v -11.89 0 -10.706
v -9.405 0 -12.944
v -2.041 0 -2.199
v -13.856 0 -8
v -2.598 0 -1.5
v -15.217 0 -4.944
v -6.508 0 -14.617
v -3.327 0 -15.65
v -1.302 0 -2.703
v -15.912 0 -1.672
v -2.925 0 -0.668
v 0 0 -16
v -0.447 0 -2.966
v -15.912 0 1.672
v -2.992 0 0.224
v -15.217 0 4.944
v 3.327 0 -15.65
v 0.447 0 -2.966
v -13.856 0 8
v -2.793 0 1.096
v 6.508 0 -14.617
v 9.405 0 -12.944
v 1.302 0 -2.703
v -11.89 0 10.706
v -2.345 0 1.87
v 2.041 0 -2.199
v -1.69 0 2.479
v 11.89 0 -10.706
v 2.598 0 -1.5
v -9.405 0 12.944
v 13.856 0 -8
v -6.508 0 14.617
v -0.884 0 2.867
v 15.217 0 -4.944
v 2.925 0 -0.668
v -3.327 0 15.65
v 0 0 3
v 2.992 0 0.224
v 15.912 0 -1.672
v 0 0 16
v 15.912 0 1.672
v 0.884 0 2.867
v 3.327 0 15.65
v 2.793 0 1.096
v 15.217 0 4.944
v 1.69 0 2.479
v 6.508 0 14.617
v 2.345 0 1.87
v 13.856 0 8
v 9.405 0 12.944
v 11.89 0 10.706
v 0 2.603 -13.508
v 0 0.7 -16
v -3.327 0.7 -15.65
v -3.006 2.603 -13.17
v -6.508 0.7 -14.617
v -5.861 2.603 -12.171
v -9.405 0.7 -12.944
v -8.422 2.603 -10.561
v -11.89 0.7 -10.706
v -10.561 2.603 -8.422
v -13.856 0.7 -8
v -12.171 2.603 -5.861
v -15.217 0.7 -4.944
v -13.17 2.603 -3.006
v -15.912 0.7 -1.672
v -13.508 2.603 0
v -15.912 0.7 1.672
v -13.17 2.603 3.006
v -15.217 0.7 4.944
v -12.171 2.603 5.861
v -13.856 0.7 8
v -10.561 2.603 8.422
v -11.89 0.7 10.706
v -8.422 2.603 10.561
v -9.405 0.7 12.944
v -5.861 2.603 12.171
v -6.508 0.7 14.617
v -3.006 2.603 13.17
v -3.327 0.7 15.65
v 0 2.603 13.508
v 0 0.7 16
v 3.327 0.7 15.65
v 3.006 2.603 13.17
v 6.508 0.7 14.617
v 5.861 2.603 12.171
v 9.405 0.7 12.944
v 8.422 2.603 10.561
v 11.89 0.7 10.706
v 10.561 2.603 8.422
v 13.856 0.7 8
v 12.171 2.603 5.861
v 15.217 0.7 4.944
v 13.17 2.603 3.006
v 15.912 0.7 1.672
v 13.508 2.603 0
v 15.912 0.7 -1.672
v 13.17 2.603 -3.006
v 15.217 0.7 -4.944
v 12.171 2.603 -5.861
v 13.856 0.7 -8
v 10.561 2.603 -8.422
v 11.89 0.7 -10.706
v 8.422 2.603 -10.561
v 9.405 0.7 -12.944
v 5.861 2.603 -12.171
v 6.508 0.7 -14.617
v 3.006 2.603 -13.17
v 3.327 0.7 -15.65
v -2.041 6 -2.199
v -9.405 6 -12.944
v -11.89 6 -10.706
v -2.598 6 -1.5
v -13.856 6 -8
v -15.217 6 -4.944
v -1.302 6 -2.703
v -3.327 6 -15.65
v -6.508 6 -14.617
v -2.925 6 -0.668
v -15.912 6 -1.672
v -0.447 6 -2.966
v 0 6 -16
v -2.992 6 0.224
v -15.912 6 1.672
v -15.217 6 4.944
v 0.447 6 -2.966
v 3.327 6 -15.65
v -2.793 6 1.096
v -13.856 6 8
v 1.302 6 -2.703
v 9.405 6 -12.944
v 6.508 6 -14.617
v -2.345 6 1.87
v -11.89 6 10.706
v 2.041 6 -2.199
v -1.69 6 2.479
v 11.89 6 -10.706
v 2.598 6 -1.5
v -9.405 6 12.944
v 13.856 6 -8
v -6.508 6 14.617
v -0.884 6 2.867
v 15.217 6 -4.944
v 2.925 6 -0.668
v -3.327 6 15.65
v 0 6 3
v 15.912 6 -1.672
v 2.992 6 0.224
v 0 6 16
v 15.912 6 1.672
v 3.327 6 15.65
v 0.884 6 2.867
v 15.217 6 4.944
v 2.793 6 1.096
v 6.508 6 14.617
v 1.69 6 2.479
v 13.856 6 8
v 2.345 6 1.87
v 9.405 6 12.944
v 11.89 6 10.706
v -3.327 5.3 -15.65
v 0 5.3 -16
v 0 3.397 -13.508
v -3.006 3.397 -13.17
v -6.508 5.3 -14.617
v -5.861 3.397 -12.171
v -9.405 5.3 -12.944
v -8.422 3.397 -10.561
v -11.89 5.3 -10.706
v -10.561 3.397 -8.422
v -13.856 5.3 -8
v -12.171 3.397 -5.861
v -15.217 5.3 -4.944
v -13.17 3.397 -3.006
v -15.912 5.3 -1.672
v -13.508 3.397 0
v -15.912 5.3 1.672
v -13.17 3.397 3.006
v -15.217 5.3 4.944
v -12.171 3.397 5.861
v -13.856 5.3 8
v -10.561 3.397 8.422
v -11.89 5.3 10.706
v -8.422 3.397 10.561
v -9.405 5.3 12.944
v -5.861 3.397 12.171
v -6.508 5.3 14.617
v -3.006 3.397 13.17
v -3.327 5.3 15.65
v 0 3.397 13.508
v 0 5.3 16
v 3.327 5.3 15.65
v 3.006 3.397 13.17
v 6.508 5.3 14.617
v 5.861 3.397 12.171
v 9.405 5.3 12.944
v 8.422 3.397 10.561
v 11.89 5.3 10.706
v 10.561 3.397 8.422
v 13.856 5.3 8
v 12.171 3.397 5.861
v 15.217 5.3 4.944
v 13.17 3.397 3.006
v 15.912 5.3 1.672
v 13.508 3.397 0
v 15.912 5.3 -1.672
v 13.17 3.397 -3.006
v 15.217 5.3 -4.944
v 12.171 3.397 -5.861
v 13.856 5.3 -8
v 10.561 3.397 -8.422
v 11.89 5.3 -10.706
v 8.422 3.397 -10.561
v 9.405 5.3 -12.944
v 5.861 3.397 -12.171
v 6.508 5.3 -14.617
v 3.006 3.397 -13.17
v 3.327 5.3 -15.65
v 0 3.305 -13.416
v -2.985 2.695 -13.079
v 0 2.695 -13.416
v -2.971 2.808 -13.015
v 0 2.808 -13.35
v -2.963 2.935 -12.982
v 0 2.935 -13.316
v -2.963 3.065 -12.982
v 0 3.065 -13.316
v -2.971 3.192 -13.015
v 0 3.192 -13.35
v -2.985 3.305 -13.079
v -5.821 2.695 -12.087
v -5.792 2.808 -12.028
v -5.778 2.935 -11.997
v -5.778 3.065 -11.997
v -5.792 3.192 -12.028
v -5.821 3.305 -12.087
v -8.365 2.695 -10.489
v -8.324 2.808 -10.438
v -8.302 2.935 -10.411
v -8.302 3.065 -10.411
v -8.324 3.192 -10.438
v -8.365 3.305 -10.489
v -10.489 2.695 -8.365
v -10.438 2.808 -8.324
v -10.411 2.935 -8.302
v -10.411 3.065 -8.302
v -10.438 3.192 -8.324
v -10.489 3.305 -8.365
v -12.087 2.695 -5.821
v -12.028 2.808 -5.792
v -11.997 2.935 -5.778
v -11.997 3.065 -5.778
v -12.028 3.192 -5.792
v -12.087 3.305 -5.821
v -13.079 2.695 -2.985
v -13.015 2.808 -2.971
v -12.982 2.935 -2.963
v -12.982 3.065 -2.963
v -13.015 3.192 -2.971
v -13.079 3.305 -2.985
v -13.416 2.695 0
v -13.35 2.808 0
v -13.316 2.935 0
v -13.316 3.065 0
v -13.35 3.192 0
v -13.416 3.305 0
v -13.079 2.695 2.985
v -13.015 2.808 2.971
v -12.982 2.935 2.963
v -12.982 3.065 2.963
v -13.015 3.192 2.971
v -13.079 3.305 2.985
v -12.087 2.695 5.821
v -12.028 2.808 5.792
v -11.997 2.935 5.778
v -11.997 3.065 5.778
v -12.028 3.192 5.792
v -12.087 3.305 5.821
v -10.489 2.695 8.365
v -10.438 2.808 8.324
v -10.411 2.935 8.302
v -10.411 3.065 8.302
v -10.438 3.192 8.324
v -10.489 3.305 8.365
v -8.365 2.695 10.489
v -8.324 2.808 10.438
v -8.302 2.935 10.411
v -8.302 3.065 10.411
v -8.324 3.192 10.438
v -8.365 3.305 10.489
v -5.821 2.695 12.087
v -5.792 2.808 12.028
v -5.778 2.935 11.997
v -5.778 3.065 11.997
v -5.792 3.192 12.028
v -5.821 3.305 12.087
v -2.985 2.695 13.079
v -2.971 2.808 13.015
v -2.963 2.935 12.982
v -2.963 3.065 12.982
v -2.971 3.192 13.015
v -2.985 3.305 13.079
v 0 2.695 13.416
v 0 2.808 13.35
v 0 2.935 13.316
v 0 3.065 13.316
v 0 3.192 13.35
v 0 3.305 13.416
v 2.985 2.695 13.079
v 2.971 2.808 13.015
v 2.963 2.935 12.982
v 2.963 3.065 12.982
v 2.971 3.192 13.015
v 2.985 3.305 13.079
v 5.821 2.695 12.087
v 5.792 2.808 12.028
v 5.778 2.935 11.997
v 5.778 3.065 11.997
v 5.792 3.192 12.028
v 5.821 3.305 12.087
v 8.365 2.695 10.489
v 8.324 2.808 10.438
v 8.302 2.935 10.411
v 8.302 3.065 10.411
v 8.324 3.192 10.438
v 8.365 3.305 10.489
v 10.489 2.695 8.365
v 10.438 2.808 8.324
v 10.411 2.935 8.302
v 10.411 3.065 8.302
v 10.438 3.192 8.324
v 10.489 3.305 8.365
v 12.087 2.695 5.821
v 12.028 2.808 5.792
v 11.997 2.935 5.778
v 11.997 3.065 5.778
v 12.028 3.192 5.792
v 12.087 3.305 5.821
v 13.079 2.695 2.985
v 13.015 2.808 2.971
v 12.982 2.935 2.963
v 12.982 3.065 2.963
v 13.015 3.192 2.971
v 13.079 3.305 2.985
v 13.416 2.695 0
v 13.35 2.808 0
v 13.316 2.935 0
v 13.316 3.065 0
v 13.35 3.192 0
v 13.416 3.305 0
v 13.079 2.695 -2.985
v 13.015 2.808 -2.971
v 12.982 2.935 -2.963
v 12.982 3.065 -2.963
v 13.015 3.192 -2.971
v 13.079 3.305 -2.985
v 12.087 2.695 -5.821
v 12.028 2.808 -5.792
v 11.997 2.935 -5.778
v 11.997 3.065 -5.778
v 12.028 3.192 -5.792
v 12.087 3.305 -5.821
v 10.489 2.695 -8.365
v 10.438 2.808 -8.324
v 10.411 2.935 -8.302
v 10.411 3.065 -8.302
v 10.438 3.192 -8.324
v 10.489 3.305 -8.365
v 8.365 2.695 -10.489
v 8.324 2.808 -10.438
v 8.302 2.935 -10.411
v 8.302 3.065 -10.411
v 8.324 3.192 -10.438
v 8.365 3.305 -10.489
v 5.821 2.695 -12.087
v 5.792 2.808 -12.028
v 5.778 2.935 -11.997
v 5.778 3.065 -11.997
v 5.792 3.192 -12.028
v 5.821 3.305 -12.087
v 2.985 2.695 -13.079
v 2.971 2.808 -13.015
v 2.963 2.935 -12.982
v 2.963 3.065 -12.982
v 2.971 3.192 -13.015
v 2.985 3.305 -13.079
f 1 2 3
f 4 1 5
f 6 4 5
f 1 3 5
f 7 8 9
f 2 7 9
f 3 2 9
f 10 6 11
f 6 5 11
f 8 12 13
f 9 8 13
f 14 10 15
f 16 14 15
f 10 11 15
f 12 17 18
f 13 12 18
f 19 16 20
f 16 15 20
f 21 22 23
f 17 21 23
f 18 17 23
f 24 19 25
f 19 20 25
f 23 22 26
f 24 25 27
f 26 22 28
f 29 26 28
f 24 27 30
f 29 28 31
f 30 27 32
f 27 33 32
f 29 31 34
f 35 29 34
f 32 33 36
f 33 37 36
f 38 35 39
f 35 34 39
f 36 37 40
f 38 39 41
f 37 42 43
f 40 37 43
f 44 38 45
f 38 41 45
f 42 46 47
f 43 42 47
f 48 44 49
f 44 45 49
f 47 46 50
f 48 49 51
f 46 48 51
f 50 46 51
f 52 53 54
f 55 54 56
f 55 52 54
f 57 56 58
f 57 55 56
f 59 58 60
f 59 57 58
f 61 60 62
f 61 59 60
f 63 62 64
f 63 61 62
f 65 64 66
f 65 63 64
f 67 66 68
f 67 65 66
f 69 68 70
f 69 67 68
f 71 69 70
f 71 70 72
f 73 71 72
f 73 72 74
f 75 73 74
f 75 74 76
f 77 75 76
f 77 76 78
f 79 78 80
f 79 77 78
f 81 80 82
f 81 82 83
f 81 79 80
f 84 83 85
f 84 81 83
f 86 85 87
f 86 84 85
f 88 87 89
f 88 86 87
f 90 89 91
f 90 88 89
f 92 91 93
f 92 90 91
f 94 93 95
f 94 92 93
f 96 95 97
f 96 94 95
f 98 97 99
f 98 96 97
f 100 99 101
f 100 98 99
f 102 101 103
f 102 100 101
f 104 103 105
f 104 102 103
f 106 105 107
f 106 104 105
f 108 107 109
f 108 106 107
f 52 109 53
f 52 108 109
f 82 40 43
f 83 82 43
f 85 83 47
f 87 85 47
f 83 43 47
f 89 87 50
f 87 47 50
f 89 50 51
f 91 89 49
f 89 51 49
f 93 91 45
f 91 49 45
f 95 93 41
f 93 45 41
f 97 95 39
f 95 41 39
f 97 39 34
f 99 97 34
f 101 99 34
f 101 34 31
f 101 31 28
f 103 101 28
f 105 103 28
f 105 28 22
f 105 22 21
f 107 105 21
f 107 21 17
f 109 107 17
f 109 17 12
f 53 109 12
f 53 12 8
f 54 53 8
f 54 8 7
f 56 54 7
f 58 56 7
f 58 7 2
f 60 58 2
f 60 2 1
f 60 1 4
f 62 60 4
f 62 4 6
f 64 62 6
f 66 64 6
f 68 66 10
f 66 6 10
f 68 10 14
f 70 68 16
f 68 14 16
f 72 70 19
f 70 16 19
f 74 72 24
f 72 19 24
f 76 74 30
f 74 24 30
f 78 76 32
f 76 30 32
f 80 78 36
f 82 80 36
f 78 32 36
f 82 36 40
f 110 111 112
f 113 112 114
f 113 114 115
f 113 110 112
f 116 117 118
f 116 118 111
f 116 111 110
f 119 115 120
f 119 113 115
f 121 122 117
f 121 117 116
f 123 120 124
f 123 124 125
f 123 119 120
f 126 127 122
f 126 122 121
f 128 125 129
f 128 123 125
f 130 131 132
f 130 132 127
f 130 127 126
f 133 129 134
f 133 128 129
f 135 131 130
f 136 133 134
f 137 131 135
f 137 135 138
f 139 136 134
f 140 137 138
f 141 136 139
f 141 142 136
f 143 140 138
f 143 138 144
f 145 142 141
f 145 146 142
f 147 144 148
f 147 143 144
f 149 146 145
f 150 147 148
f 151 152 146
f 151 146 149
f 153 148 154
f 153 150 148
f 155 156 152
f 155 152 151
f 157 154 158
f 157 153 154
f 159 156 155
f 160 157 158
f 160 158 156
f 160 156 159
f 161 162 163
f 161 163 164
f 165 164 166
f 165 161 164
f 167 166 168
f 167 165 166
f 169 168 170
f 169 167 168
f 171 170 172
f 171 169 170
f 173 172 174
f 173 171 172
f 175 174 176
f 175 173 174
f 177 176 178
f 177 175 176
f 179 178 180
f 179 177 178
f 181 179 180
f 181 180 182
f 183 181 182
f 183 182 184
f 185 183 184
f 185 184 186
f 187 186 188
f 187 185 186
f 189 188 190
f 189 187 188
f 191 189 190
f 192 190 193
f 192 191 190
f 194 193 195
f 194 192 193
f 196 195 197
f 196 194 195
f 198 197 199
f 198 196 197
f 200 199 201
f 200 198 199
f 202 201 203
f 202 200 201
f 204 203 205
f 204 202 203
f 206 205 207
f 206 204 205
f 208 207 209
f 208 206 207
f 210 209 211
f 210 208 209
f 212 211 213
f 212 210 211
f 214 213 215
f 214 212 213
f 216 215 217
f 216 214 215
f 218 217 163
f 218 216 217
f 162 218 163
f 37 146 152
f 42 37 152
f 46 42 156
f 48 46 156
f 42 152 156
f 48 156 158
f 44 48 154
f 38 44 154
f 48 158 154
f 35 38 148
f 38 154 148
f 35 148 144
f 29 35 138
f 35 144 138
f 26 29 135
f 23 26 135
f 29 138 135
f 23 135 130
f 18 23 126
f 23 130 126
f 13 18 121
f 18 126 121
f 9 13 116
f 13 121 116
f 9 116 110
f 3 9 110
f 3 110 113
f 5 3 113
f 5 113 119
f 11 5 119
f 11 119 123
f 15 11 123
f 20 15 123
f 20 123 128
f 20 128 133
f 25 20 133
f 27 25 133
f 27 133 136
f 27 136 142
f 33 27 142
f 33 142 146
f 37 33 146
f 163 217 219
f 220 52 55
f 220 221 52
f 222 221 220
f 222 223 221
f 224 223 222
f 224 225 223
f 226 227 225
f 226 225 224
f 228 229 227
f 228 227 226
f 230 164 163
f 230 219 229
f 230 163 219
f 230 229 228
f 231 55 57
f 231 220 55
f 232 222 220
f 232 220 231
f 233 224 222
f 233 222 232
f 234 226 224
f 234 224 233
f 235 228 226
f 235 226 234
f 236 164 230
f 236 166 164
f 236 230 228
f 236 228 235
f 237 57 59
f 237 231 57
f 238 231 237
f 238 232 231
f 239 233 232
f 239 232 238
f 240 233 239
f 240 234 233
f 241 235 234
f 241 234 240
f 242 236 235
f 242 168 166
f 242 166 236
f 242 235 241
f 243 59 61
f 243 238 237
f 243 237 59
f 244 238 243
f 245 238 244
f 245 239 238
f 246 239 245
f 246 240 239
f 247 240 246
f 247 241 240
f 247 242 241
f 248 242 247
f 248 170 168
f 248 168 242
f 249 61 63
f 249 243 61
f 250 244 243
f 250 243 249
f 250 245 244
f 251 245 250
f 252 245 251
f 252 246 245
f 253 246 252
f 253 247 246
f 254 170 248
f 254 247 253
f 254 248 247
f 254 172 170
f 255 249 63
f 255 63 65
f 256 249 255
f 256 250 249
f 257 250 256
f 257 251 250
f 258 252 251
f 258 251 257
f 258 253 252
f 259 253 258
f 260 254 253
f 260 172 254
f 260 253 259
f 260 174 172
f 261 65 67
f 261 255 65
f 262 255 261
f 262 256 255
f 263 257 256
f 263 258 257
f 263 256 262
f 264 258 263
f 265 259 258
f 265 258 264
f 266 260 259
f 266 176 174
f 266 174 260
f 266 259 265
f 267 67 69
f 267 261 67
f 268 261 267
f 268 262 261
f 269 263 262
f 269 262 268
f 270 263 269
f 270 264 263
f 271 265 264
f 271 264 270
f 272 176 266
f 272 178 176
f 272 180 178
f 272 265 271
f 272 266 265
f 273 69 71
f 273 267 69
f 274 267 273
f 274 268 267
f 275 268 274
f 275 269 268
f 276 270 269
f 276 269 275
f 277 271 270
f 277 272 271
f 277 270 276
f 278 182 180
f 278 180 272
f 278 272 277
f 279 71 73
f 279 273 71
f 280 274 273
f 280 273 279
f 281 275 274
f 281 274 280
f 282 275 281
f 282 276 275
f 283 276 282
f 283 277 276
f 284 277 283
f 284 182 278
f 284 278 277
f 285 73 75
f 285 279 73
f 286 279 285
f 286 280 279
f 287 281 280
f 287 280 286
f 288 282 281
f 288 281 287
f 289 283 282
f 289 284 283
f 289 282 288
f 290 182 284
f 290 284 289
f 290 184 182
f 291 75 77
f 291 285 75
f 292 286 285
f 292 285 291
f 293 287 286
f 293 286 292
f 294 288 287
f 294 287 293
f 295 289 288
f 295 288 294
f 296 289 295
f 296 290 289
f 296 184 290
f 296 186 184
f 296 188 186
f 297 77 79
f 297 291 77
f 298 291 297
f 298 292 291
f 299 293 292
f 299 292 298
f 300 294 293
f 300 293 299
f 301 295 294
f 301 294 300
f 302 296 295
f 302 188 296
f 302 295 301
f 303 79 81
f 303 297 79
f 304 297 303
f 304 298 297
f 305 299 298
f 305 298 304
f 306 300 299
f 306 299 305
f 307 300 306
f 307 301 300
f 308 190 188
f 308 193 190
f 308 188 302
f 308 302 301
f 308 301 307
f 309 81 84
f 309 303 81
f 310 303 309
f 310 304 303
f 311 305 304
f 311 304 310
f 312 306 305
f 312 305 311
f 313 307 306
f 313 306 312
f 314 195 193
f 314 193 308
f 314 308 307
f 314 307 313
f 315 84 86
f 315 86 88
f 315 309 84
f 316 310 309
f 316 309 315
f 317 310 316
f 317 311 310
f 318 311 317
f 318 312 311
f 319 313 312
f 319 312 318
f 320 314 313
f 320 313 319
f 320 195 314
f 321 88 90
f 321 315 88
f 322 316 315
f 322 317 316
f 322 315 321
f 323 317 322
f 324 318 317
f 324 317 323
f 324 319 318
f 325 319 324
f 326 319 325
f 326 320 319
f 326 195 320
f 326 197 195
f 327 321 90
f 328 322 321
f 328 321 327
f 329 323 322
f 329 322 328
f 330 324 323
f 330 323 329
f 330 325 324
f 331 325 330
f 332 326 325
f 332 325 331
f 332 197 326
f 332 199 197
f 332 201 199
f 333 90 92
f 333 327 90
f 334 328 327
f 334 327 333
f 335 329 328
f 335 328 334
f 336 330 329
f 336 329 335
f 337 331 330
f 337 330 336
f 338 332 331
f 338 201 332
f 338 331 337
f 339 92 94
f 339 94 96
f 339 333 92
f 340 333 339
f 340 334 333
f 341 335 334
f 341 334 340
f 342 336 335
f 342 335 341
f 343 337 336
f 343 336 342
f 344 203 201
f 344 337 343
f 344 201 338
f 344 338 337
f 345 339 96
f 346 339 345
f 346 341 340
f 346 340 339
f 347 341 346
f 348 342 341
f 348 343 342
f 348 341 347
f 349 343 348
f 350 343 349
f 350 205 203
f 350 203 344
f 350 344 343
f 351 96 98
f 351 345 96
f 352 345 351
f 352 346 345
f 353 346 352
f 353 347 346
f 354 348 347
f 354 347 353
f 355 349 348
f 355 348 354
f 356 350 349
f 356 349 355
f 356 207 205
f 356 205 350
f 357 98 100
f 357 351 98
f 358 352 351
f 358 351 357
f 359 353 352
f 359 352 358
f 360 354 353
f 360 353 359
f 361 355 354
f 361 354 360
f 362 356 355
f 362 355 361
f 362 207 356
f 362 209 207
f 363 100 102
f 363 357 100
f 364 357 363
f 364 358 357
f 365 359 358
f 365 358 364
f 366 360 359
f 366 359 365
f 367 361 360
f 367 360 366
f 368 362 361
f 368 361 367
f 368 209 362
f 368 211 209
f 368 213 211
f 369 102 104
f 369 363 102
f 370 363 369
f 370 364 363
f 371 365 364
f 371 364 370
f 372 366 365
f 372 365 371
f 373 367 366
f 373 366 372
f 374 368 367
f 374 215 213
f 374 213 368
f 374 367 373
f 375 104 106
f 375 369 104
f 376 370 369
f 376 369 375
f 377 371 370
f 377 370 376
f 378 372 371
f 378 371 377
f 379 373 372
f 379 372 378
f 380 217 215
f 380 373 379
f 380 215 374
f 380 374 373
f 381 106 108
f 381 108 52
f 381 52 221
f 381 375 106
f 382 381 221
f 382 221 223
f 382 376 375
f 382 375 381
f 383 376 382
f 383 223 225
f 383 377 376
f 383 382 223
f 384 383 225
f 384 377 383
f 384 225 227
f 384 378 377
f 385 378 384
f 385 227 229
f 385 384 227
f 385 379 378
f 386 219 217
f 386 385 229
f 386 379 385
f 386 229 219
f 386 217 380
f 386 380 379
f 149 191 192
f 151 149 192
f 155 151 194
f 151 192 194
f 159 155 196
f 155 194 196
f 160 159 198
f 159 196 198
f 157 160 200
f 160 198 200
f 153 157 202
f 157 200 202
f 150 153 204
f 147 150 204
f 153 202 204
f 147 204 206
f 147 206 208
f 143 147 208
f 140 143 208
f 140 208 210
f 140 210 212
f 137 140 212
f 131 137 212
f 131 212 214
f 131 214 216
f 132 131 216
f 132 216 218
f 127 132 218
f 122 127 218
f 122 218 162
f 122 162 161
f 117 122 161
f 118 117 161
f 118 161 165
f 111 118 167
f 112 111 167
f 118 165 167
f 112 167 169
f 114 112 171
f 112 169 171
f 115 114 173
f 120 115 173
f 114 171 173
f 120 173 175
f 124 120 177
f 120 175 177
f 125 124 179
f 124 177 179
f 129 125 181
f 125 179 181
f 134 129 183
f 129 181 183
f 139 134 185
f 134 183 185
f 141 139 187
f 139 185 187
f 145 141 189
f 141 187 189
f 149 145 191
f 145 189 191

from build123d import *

# Parameters (mm, degrees)
SKETCH_1_R          = 16
EXTRUDE_1_DEPTH     = 6
SKETCH_4_R          = 3
CUT_EXTRUDE_2_DEPTH = 24.409399821


with BuildPart() as part:
    # Эскиз1 → Вытянуть1 (new body)
    with BuildSketch(Plane(origin=(0, 0, 0), x_dir=(1, 0, 0), z_dir=(0, 1, 0))):
        with Locations(Location((0, 0, 0), (0, 0, 270))):
            Circle(SKETCH_1_R)
    extrude(amount=EXTRUDE_1_DEPTH)

    # Эскиз2 → Вырез-Повернуть1 (revolve, cut)
    with BuildSketch(Plane.XY, mode=Mode.PRIVATE) as cut_revolve_1_sk:
        with BuildLine():
            Line((16, 0.7), (13.508420421, 2.60261237))
            ThreePointArc((13.508420421, 2.60261237), (13.311872347, 3), (13.508420421, 3.39738763))
            Line((13.508420421, 3.39738763), (16, 5.3))
            Line((16, 5.3), (16, 0.7))
        make_face()
    revolve(cut_revolve_1_sk.sketch.rotate(Axis((0, 0, 0), (0, 1, 0)), 90), axis=Axis((0, 0, 0), (0, 1, 0)), mode=Mode.SUBTRACT)

    # Эскиз4 → Вытянуть2 (cut, through all)
    with BuildSketch(Plane(origin=(0, 6, 0), x_dir=(1, 0, 0), z_dir=(0, 1, 0))):
        with Locations(Location((0, 0, 0), (0, 0, 270))):
            Circle(SKETCH_4_R)
    extrude(amount=-CUT_EXTRUDE_2_DEPTH, mode=Mode.SUBTRACT)


solid = part.part
